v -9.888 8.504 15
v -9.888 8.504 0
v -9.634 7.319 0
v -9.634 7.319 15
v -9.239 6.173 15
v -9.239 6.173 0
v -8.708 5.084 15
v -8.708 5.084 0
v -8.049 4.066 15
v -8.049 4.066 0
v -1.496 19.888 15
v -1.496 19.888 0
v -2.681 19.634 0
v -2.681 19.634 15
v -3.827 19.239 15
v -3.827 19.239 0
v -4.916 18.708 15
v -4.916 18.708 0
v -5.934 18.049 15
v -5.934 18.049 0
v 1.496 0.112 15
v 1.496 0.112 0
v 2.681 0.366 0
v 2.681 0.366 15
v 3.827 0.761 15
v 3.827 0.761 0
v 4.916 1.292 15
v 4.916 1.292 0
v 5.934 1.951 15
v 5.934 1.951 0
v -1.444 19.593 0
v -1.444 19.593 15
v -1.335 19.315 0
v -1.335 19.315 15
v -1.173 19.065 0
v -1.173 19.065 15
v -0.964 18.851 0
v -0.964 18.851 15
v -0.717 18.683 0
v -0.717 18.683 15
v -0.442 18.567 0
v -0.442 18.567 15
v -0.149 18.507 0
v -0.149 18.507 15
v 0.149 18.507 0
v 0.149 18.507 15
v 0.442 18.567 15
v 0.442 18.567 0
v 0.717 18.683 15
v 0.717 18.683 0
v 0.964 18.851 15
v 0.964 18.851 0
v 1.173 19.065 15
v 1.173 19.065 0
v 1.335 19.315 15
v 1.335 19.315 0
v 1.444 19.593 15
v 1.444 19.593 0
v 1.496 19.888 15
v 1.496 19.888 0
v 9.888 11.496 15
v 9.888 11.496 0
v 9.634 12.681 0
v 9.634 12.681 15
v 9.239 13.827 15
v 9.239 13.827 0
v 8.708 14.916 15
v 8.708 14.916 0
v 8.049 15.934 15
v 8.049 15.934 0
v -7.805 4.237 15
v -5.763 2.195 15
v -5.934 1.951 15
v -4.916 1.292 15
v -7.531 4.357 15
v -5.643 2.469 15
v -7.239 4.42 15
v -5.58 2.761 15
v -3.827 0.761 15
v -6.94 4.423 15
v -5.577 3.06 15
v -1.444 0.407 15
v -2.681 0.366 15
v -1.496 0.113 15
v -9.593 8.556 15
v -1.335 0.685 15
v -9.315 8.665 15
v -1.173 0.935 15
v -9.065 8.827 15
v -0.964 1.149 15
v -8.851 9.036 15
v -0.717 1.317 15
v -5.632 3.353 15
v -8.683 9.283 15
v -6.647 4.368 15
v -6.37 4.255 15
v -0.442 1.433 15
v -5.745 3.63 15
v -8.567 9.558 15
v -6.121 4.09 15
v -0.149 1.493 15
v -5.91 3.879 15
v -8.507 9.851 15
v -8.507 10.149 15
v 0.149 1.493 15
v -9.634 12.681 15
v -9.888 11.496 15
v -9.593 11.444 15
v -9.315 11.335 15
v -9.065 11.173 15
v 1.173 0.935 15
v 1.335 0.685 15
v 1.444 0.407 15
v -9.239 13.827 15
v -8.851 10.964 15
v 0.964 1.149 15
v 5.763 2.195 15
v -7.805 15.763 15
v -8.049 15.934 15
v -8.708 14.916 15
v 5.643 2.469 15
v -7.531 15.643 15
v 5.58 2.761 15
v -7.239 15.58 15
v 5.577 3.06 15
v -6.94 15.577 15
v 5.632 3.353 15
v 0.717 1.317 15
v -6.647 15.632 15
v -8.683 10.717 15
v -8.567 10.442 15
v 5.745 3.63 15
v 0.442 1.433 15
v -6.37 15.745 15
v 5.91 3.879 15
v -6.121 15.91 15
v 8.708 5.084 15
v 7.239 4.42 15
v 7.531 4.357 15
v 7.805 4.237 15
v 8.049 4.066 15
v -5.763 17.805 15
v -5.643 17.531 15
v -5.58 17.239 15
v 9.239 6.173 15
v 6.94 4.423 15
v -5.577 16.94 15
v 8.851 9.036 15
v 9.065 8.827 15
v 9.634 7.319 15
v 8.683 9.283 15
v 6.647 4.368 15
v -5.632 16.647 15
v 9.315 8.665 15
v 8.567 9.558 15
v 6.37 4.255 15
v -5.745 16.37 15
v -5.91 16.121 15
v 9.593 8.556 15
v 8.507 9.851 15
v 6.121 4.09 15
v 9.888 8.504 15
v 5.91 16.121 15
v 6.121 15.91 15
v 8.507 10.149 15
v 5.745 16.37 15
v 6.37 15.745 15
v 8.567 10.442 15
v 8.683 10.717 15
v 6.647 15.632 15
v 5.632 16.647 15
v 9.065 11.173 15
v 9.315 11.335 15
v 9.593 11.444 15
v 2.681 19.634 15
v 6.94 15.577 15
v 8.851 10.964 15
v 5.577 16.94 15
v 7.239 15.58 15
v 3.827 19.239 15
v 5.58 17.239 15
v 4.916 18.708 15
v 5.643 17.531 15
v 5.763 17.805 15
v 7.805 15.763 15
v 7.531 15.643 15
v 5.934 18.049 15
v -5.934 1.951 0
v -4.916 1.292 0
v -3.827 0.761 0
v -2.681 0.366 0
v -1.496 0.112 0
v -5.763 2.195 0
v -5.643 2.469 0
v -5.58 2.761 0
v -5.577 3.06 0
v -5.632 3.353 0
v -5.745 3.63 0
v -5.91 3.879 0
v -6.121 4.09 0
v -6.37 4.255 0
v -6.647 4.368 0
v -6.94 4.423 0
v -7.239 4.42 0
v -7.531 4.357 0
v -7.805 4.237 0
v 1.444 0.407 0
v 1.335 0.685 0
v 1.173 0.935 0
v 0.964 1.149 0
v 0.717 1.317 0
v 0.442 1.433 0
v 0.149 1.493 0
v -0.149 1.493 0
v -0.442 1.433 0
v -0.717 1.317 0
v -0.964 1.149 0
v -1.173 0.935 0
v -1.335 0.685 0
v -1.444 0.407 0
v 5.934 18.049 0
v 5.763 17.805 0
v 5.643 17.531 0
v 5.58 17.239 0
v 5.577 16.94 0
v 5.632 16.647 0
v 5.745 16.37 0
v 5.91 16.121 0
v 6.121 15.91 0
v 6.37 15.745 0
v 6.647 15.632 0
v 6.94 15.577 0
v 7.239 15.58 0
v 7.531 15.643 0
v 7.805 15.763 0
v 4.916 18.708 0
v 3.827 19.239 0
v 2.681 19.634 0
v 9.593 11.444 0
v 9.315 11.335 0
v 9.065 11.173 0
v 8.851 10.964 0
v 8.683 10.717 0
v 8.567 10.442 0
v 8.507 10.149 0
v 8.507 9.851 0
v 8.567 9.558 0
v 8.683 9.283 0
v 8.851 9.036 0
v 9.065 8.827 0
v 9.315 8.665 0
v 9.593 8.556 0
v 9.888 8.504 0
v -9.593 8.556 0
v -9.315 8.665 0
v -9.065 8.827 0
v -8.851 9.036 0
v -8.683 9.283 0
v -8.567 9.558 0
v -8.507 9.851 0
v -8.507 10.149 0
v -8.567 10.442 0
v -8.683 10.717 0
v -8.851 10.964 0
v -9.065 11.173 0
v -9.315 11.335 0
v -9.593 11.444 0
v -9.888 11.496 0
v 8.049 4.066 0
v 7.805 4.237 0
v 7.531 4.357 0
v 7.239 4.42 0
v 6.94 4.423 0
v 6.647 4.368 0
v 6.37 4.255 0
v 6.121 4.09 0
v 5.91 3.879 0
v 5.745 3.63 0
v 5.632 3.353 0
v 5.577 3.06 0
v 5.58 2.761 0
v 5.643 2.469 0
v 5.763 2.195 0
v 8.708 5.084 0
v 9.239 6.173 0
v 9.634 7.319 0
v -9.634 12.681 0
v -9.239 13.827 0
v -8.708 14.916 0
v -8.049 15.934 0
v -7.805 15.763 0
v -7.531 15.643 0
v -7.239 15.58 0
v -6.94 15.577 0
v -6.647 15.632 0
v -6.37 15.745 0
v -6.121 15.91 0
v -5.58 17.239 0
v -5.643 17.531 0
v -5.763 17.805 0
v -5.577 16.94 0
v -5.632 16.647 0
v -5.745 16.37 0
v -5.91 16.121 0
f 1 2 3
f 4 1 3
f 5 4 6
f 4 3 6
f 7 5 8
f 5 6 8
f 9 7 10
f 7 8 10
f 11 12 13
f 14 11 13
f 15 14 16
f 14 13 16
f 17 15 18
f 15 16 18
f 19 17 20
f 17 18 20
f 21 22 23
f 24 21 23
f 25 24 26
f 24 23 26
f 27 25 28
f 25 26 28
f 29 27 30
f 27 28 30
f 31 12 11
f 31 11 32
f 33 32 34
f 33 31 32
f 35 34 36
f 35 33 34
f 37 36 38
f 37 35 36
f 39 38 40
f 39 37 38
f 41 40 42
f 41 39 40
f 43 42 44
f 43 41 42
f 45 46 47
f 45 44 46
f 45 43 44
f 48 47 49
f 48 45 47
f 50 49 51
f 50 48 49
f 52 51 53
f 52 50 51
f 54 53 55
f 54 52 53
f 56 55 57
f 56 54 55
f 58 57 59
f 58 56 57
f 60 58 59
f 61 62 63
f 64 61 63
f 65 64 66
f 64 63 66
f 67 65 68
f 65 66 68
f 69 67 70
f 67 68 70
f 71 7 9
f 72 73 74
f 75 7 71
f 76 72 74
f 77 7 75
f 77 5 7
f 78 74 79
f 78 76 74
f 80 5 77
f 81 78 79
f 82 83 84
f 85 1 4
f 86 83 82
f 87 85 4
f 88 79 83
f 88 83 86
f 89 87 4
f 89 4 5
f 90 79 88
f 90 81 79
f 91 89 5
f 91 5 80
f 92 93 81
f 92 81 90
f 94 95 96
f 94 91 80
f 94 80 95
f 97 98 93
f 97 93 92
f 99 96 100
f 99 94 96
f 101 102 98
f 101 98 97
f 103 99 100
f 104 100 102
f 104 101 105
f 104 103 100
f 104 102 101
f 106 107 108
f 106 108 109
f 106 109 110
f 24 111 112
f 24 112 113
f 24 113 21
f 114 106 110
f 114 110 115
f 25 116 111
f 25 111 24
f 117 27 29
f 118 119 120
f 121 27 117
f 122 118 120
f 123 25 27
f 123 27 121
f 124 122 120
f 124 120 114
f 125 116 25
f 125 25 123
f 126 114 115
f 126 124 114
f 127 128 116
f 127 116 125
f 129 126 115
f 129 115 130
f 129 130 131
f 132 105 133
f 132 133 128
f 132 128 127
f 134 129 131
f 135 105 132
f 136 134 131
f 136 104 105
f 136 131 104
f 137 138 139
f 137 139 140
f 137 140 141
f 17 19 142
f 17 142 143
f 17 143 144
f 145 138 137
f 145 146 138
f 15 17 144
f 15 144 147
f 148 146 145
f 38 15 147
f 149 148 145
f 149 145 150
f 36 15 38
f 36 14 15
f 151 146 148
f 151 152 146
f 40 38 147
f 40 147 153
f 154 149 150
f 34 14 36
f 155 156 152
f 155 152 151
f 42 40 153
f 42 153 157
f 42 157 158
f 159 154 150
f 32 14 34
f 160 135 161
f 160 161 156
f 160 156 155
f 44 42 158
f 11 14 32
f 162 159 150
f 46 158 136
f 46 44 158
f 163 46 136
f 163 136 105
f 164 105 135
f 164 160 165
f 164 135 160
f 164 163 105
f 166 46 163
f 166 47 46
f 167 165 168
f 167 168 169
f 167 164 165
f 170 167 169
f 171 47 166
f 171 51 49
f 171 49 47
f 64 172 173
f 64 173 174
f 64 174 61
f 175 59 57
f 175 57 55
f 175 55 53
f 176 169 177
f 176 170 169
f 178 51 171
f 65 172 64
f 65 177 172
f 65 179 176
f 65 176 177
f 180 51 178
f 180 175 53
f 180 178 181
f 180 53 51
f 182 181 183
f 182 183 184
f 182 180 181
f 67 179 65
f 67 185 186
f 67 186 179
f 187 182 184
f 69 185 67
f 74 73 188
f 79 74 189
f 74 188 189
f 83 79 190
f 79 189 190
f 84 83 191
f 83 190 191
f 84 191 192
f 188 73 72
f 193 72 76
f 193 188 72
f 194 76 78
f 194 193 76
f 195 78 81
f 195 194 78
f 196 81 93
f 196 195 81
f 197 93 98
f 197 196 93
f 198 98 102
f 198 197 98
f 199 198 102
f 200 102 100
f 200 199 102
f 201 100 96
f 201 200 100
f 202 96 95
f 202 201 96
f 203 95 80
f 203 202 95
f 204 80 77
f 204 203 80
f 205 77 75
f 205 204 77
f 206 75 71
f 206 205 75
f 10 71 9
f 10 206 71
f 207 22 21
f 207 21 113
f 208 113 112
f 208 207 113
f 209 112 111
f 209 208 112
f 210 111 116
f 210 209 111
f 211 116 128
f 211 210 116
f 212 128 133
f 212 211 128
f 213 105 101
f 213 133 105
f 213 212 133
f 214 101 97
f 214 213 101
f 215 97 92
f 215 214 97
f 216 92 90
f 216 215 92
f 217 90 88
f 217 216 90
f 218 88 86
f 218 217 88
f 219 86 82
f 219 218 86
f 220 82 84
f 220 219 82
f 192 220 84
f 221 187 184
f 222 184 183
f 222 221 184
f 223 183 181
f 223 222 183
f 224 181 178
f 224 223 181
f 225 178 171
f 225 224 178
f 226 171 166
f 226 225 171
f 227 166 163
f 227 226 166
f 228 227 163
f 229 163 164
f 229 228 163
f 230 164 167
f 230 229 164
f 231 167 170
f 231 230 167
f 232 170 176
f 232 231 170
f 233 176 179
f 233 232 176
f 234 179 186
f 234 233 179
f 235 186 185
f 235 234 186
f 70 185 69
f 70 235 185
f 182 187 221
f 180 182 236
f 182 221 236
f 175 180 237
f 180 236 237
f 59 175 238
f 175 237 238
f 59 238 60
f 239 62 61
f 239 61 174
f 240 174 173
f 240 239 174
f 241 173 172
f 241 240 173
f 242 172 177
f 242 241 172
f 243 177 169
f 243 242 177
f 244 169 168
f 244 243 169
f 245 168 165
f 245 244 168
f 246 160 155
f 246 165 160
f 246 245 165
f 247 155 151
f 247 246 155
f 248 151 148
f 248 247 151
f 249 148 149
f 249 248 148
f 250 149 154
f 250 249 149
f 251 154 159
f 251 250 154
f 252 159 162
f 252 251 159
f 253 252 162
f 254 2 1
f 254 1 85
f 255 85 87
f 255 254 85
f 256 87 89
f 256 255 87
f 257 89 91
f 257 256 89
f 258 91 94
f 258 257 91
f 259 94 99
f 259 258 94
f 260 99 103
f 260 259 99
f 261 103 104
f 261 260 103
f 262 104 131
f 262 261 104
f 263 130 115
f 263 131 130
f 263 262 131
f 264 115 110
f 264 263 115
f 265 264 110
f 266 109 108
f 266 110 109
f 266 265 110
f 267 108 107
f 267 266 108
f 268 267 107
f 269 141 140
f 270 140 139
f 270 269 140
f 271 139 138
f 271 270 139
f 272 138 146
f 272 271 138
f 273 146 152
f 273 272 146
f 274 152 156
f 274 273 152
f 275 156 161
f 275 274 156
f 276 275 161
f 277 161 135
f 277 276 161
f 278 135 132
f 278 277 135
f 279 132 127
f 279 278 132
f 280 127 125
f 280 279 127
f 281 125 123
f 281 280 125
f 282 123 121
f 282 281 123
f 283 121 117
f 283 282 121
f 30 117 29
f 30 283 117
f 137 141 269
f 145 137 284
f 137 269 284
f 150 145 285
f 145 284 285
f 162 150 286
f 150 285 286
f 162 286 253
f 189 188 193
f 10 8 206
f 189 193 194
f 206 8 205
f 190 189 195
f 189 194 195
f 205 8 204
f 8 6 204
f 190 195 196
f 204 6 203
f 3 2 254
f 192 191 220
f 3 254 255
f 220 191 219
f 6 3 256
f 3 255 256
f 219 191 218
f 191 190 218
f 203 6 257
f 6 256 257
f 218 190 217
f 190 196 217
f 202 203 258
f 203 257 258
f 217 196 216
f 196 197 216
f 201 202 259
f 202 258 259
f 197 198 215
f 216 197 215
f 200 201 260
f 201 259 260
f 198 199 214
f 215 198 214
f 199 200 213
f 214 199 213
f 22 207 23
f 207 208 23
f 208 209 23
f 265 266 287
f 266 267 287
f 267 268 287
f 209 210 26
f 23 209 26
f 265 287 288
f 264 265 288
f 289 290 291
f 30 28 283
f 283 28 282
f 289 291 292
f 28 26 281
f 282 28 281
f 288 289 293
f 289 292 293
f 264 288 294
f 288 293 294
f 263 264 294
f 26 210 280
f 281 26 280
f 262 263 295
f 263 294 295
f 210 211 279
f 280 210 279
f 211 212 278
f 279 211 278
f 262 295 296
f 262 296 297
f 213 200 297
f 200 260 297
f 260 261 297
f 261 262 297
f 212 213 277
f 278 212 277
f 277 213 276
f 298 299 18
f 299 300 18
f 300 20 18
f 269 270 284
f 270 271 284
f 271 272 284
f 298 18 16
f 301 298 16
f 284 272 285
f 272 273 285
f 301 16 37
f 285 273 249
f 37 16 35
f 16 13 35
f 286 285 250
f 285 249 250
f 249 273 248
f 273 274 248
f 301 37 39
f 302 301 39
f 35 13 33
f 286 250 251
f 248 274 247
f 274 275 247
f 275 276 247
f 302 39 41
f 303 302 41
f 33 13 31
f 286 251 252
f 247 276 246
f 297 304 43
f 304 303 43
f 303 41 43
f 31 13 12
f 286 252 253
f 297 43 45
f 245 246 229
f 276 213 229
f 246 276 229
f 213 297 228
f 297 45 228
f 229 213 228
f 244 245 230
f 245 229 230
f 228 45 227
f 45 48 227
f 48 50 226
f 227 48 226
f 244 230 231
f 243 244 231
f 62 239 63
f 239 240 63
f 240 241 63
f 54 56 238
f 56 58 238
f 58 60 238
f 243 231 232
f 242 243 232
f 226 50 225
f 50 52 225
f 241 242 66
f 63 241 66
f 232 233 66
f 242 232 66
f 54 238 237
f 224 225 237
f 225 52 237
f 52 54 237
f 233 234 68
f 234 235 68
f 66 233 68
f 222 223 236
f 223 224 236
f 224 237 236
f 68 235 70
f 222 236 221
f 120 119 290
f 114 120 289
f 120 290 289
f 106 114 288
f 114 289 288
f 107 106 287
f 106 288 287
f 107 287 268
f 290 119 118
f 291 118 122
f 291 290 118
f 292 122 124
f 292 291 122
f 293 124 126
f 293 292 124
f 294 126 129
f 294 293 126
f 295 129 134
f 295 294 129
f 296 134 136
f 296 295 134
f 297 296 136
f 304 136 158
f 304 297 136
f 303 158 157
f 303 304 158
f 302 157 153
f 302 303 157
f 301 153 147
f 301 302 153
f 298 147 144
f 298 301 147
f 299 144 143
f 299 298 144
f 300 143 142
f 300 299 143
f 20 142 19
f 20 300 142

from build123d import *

# Parameters (mm, degrees)
CYLINDER001_R     = 1.5
CYLINDER001_DEPTH = 40
ARRAY_COUNT       = 8
CYLINDER_R        = 10
CYLINDER_DEPTH    = 15


with BuildPart() as array:
    # Cylinder001 → Cylinder001 (new body)
    with BuildSketch(Plane.XY):
        Circle(CYLINDER001_R)
    extrude(amount=CYLINDER001_DEPTH)

    # Array: Array ×8 about axis
    array_axis = Axis((0, 10, 0), (0, 0, 1))


with BuildPart() as array_1:
    add(array.part)
    for i in range(1, ARRAY_COUNT):
        add(array.part.rotate(array_axis, i * 360 / ARRAY_COUNT))


with BuildPart() as cut:
    # Cylinder → Cylinder (new body)
    with BuildSketch(Plane(origin=(0, 10, 0), x_dir=(1, 0, 0), z_dir=(0, 0, 1))):
        Circle(CYLINDER_R)
    extrude(amount=CYLINDER_DEPTH)

    # Cut: cut Array
    add(array_1.part, mode=Mode.SUBTRACT)


solid = cut.part
